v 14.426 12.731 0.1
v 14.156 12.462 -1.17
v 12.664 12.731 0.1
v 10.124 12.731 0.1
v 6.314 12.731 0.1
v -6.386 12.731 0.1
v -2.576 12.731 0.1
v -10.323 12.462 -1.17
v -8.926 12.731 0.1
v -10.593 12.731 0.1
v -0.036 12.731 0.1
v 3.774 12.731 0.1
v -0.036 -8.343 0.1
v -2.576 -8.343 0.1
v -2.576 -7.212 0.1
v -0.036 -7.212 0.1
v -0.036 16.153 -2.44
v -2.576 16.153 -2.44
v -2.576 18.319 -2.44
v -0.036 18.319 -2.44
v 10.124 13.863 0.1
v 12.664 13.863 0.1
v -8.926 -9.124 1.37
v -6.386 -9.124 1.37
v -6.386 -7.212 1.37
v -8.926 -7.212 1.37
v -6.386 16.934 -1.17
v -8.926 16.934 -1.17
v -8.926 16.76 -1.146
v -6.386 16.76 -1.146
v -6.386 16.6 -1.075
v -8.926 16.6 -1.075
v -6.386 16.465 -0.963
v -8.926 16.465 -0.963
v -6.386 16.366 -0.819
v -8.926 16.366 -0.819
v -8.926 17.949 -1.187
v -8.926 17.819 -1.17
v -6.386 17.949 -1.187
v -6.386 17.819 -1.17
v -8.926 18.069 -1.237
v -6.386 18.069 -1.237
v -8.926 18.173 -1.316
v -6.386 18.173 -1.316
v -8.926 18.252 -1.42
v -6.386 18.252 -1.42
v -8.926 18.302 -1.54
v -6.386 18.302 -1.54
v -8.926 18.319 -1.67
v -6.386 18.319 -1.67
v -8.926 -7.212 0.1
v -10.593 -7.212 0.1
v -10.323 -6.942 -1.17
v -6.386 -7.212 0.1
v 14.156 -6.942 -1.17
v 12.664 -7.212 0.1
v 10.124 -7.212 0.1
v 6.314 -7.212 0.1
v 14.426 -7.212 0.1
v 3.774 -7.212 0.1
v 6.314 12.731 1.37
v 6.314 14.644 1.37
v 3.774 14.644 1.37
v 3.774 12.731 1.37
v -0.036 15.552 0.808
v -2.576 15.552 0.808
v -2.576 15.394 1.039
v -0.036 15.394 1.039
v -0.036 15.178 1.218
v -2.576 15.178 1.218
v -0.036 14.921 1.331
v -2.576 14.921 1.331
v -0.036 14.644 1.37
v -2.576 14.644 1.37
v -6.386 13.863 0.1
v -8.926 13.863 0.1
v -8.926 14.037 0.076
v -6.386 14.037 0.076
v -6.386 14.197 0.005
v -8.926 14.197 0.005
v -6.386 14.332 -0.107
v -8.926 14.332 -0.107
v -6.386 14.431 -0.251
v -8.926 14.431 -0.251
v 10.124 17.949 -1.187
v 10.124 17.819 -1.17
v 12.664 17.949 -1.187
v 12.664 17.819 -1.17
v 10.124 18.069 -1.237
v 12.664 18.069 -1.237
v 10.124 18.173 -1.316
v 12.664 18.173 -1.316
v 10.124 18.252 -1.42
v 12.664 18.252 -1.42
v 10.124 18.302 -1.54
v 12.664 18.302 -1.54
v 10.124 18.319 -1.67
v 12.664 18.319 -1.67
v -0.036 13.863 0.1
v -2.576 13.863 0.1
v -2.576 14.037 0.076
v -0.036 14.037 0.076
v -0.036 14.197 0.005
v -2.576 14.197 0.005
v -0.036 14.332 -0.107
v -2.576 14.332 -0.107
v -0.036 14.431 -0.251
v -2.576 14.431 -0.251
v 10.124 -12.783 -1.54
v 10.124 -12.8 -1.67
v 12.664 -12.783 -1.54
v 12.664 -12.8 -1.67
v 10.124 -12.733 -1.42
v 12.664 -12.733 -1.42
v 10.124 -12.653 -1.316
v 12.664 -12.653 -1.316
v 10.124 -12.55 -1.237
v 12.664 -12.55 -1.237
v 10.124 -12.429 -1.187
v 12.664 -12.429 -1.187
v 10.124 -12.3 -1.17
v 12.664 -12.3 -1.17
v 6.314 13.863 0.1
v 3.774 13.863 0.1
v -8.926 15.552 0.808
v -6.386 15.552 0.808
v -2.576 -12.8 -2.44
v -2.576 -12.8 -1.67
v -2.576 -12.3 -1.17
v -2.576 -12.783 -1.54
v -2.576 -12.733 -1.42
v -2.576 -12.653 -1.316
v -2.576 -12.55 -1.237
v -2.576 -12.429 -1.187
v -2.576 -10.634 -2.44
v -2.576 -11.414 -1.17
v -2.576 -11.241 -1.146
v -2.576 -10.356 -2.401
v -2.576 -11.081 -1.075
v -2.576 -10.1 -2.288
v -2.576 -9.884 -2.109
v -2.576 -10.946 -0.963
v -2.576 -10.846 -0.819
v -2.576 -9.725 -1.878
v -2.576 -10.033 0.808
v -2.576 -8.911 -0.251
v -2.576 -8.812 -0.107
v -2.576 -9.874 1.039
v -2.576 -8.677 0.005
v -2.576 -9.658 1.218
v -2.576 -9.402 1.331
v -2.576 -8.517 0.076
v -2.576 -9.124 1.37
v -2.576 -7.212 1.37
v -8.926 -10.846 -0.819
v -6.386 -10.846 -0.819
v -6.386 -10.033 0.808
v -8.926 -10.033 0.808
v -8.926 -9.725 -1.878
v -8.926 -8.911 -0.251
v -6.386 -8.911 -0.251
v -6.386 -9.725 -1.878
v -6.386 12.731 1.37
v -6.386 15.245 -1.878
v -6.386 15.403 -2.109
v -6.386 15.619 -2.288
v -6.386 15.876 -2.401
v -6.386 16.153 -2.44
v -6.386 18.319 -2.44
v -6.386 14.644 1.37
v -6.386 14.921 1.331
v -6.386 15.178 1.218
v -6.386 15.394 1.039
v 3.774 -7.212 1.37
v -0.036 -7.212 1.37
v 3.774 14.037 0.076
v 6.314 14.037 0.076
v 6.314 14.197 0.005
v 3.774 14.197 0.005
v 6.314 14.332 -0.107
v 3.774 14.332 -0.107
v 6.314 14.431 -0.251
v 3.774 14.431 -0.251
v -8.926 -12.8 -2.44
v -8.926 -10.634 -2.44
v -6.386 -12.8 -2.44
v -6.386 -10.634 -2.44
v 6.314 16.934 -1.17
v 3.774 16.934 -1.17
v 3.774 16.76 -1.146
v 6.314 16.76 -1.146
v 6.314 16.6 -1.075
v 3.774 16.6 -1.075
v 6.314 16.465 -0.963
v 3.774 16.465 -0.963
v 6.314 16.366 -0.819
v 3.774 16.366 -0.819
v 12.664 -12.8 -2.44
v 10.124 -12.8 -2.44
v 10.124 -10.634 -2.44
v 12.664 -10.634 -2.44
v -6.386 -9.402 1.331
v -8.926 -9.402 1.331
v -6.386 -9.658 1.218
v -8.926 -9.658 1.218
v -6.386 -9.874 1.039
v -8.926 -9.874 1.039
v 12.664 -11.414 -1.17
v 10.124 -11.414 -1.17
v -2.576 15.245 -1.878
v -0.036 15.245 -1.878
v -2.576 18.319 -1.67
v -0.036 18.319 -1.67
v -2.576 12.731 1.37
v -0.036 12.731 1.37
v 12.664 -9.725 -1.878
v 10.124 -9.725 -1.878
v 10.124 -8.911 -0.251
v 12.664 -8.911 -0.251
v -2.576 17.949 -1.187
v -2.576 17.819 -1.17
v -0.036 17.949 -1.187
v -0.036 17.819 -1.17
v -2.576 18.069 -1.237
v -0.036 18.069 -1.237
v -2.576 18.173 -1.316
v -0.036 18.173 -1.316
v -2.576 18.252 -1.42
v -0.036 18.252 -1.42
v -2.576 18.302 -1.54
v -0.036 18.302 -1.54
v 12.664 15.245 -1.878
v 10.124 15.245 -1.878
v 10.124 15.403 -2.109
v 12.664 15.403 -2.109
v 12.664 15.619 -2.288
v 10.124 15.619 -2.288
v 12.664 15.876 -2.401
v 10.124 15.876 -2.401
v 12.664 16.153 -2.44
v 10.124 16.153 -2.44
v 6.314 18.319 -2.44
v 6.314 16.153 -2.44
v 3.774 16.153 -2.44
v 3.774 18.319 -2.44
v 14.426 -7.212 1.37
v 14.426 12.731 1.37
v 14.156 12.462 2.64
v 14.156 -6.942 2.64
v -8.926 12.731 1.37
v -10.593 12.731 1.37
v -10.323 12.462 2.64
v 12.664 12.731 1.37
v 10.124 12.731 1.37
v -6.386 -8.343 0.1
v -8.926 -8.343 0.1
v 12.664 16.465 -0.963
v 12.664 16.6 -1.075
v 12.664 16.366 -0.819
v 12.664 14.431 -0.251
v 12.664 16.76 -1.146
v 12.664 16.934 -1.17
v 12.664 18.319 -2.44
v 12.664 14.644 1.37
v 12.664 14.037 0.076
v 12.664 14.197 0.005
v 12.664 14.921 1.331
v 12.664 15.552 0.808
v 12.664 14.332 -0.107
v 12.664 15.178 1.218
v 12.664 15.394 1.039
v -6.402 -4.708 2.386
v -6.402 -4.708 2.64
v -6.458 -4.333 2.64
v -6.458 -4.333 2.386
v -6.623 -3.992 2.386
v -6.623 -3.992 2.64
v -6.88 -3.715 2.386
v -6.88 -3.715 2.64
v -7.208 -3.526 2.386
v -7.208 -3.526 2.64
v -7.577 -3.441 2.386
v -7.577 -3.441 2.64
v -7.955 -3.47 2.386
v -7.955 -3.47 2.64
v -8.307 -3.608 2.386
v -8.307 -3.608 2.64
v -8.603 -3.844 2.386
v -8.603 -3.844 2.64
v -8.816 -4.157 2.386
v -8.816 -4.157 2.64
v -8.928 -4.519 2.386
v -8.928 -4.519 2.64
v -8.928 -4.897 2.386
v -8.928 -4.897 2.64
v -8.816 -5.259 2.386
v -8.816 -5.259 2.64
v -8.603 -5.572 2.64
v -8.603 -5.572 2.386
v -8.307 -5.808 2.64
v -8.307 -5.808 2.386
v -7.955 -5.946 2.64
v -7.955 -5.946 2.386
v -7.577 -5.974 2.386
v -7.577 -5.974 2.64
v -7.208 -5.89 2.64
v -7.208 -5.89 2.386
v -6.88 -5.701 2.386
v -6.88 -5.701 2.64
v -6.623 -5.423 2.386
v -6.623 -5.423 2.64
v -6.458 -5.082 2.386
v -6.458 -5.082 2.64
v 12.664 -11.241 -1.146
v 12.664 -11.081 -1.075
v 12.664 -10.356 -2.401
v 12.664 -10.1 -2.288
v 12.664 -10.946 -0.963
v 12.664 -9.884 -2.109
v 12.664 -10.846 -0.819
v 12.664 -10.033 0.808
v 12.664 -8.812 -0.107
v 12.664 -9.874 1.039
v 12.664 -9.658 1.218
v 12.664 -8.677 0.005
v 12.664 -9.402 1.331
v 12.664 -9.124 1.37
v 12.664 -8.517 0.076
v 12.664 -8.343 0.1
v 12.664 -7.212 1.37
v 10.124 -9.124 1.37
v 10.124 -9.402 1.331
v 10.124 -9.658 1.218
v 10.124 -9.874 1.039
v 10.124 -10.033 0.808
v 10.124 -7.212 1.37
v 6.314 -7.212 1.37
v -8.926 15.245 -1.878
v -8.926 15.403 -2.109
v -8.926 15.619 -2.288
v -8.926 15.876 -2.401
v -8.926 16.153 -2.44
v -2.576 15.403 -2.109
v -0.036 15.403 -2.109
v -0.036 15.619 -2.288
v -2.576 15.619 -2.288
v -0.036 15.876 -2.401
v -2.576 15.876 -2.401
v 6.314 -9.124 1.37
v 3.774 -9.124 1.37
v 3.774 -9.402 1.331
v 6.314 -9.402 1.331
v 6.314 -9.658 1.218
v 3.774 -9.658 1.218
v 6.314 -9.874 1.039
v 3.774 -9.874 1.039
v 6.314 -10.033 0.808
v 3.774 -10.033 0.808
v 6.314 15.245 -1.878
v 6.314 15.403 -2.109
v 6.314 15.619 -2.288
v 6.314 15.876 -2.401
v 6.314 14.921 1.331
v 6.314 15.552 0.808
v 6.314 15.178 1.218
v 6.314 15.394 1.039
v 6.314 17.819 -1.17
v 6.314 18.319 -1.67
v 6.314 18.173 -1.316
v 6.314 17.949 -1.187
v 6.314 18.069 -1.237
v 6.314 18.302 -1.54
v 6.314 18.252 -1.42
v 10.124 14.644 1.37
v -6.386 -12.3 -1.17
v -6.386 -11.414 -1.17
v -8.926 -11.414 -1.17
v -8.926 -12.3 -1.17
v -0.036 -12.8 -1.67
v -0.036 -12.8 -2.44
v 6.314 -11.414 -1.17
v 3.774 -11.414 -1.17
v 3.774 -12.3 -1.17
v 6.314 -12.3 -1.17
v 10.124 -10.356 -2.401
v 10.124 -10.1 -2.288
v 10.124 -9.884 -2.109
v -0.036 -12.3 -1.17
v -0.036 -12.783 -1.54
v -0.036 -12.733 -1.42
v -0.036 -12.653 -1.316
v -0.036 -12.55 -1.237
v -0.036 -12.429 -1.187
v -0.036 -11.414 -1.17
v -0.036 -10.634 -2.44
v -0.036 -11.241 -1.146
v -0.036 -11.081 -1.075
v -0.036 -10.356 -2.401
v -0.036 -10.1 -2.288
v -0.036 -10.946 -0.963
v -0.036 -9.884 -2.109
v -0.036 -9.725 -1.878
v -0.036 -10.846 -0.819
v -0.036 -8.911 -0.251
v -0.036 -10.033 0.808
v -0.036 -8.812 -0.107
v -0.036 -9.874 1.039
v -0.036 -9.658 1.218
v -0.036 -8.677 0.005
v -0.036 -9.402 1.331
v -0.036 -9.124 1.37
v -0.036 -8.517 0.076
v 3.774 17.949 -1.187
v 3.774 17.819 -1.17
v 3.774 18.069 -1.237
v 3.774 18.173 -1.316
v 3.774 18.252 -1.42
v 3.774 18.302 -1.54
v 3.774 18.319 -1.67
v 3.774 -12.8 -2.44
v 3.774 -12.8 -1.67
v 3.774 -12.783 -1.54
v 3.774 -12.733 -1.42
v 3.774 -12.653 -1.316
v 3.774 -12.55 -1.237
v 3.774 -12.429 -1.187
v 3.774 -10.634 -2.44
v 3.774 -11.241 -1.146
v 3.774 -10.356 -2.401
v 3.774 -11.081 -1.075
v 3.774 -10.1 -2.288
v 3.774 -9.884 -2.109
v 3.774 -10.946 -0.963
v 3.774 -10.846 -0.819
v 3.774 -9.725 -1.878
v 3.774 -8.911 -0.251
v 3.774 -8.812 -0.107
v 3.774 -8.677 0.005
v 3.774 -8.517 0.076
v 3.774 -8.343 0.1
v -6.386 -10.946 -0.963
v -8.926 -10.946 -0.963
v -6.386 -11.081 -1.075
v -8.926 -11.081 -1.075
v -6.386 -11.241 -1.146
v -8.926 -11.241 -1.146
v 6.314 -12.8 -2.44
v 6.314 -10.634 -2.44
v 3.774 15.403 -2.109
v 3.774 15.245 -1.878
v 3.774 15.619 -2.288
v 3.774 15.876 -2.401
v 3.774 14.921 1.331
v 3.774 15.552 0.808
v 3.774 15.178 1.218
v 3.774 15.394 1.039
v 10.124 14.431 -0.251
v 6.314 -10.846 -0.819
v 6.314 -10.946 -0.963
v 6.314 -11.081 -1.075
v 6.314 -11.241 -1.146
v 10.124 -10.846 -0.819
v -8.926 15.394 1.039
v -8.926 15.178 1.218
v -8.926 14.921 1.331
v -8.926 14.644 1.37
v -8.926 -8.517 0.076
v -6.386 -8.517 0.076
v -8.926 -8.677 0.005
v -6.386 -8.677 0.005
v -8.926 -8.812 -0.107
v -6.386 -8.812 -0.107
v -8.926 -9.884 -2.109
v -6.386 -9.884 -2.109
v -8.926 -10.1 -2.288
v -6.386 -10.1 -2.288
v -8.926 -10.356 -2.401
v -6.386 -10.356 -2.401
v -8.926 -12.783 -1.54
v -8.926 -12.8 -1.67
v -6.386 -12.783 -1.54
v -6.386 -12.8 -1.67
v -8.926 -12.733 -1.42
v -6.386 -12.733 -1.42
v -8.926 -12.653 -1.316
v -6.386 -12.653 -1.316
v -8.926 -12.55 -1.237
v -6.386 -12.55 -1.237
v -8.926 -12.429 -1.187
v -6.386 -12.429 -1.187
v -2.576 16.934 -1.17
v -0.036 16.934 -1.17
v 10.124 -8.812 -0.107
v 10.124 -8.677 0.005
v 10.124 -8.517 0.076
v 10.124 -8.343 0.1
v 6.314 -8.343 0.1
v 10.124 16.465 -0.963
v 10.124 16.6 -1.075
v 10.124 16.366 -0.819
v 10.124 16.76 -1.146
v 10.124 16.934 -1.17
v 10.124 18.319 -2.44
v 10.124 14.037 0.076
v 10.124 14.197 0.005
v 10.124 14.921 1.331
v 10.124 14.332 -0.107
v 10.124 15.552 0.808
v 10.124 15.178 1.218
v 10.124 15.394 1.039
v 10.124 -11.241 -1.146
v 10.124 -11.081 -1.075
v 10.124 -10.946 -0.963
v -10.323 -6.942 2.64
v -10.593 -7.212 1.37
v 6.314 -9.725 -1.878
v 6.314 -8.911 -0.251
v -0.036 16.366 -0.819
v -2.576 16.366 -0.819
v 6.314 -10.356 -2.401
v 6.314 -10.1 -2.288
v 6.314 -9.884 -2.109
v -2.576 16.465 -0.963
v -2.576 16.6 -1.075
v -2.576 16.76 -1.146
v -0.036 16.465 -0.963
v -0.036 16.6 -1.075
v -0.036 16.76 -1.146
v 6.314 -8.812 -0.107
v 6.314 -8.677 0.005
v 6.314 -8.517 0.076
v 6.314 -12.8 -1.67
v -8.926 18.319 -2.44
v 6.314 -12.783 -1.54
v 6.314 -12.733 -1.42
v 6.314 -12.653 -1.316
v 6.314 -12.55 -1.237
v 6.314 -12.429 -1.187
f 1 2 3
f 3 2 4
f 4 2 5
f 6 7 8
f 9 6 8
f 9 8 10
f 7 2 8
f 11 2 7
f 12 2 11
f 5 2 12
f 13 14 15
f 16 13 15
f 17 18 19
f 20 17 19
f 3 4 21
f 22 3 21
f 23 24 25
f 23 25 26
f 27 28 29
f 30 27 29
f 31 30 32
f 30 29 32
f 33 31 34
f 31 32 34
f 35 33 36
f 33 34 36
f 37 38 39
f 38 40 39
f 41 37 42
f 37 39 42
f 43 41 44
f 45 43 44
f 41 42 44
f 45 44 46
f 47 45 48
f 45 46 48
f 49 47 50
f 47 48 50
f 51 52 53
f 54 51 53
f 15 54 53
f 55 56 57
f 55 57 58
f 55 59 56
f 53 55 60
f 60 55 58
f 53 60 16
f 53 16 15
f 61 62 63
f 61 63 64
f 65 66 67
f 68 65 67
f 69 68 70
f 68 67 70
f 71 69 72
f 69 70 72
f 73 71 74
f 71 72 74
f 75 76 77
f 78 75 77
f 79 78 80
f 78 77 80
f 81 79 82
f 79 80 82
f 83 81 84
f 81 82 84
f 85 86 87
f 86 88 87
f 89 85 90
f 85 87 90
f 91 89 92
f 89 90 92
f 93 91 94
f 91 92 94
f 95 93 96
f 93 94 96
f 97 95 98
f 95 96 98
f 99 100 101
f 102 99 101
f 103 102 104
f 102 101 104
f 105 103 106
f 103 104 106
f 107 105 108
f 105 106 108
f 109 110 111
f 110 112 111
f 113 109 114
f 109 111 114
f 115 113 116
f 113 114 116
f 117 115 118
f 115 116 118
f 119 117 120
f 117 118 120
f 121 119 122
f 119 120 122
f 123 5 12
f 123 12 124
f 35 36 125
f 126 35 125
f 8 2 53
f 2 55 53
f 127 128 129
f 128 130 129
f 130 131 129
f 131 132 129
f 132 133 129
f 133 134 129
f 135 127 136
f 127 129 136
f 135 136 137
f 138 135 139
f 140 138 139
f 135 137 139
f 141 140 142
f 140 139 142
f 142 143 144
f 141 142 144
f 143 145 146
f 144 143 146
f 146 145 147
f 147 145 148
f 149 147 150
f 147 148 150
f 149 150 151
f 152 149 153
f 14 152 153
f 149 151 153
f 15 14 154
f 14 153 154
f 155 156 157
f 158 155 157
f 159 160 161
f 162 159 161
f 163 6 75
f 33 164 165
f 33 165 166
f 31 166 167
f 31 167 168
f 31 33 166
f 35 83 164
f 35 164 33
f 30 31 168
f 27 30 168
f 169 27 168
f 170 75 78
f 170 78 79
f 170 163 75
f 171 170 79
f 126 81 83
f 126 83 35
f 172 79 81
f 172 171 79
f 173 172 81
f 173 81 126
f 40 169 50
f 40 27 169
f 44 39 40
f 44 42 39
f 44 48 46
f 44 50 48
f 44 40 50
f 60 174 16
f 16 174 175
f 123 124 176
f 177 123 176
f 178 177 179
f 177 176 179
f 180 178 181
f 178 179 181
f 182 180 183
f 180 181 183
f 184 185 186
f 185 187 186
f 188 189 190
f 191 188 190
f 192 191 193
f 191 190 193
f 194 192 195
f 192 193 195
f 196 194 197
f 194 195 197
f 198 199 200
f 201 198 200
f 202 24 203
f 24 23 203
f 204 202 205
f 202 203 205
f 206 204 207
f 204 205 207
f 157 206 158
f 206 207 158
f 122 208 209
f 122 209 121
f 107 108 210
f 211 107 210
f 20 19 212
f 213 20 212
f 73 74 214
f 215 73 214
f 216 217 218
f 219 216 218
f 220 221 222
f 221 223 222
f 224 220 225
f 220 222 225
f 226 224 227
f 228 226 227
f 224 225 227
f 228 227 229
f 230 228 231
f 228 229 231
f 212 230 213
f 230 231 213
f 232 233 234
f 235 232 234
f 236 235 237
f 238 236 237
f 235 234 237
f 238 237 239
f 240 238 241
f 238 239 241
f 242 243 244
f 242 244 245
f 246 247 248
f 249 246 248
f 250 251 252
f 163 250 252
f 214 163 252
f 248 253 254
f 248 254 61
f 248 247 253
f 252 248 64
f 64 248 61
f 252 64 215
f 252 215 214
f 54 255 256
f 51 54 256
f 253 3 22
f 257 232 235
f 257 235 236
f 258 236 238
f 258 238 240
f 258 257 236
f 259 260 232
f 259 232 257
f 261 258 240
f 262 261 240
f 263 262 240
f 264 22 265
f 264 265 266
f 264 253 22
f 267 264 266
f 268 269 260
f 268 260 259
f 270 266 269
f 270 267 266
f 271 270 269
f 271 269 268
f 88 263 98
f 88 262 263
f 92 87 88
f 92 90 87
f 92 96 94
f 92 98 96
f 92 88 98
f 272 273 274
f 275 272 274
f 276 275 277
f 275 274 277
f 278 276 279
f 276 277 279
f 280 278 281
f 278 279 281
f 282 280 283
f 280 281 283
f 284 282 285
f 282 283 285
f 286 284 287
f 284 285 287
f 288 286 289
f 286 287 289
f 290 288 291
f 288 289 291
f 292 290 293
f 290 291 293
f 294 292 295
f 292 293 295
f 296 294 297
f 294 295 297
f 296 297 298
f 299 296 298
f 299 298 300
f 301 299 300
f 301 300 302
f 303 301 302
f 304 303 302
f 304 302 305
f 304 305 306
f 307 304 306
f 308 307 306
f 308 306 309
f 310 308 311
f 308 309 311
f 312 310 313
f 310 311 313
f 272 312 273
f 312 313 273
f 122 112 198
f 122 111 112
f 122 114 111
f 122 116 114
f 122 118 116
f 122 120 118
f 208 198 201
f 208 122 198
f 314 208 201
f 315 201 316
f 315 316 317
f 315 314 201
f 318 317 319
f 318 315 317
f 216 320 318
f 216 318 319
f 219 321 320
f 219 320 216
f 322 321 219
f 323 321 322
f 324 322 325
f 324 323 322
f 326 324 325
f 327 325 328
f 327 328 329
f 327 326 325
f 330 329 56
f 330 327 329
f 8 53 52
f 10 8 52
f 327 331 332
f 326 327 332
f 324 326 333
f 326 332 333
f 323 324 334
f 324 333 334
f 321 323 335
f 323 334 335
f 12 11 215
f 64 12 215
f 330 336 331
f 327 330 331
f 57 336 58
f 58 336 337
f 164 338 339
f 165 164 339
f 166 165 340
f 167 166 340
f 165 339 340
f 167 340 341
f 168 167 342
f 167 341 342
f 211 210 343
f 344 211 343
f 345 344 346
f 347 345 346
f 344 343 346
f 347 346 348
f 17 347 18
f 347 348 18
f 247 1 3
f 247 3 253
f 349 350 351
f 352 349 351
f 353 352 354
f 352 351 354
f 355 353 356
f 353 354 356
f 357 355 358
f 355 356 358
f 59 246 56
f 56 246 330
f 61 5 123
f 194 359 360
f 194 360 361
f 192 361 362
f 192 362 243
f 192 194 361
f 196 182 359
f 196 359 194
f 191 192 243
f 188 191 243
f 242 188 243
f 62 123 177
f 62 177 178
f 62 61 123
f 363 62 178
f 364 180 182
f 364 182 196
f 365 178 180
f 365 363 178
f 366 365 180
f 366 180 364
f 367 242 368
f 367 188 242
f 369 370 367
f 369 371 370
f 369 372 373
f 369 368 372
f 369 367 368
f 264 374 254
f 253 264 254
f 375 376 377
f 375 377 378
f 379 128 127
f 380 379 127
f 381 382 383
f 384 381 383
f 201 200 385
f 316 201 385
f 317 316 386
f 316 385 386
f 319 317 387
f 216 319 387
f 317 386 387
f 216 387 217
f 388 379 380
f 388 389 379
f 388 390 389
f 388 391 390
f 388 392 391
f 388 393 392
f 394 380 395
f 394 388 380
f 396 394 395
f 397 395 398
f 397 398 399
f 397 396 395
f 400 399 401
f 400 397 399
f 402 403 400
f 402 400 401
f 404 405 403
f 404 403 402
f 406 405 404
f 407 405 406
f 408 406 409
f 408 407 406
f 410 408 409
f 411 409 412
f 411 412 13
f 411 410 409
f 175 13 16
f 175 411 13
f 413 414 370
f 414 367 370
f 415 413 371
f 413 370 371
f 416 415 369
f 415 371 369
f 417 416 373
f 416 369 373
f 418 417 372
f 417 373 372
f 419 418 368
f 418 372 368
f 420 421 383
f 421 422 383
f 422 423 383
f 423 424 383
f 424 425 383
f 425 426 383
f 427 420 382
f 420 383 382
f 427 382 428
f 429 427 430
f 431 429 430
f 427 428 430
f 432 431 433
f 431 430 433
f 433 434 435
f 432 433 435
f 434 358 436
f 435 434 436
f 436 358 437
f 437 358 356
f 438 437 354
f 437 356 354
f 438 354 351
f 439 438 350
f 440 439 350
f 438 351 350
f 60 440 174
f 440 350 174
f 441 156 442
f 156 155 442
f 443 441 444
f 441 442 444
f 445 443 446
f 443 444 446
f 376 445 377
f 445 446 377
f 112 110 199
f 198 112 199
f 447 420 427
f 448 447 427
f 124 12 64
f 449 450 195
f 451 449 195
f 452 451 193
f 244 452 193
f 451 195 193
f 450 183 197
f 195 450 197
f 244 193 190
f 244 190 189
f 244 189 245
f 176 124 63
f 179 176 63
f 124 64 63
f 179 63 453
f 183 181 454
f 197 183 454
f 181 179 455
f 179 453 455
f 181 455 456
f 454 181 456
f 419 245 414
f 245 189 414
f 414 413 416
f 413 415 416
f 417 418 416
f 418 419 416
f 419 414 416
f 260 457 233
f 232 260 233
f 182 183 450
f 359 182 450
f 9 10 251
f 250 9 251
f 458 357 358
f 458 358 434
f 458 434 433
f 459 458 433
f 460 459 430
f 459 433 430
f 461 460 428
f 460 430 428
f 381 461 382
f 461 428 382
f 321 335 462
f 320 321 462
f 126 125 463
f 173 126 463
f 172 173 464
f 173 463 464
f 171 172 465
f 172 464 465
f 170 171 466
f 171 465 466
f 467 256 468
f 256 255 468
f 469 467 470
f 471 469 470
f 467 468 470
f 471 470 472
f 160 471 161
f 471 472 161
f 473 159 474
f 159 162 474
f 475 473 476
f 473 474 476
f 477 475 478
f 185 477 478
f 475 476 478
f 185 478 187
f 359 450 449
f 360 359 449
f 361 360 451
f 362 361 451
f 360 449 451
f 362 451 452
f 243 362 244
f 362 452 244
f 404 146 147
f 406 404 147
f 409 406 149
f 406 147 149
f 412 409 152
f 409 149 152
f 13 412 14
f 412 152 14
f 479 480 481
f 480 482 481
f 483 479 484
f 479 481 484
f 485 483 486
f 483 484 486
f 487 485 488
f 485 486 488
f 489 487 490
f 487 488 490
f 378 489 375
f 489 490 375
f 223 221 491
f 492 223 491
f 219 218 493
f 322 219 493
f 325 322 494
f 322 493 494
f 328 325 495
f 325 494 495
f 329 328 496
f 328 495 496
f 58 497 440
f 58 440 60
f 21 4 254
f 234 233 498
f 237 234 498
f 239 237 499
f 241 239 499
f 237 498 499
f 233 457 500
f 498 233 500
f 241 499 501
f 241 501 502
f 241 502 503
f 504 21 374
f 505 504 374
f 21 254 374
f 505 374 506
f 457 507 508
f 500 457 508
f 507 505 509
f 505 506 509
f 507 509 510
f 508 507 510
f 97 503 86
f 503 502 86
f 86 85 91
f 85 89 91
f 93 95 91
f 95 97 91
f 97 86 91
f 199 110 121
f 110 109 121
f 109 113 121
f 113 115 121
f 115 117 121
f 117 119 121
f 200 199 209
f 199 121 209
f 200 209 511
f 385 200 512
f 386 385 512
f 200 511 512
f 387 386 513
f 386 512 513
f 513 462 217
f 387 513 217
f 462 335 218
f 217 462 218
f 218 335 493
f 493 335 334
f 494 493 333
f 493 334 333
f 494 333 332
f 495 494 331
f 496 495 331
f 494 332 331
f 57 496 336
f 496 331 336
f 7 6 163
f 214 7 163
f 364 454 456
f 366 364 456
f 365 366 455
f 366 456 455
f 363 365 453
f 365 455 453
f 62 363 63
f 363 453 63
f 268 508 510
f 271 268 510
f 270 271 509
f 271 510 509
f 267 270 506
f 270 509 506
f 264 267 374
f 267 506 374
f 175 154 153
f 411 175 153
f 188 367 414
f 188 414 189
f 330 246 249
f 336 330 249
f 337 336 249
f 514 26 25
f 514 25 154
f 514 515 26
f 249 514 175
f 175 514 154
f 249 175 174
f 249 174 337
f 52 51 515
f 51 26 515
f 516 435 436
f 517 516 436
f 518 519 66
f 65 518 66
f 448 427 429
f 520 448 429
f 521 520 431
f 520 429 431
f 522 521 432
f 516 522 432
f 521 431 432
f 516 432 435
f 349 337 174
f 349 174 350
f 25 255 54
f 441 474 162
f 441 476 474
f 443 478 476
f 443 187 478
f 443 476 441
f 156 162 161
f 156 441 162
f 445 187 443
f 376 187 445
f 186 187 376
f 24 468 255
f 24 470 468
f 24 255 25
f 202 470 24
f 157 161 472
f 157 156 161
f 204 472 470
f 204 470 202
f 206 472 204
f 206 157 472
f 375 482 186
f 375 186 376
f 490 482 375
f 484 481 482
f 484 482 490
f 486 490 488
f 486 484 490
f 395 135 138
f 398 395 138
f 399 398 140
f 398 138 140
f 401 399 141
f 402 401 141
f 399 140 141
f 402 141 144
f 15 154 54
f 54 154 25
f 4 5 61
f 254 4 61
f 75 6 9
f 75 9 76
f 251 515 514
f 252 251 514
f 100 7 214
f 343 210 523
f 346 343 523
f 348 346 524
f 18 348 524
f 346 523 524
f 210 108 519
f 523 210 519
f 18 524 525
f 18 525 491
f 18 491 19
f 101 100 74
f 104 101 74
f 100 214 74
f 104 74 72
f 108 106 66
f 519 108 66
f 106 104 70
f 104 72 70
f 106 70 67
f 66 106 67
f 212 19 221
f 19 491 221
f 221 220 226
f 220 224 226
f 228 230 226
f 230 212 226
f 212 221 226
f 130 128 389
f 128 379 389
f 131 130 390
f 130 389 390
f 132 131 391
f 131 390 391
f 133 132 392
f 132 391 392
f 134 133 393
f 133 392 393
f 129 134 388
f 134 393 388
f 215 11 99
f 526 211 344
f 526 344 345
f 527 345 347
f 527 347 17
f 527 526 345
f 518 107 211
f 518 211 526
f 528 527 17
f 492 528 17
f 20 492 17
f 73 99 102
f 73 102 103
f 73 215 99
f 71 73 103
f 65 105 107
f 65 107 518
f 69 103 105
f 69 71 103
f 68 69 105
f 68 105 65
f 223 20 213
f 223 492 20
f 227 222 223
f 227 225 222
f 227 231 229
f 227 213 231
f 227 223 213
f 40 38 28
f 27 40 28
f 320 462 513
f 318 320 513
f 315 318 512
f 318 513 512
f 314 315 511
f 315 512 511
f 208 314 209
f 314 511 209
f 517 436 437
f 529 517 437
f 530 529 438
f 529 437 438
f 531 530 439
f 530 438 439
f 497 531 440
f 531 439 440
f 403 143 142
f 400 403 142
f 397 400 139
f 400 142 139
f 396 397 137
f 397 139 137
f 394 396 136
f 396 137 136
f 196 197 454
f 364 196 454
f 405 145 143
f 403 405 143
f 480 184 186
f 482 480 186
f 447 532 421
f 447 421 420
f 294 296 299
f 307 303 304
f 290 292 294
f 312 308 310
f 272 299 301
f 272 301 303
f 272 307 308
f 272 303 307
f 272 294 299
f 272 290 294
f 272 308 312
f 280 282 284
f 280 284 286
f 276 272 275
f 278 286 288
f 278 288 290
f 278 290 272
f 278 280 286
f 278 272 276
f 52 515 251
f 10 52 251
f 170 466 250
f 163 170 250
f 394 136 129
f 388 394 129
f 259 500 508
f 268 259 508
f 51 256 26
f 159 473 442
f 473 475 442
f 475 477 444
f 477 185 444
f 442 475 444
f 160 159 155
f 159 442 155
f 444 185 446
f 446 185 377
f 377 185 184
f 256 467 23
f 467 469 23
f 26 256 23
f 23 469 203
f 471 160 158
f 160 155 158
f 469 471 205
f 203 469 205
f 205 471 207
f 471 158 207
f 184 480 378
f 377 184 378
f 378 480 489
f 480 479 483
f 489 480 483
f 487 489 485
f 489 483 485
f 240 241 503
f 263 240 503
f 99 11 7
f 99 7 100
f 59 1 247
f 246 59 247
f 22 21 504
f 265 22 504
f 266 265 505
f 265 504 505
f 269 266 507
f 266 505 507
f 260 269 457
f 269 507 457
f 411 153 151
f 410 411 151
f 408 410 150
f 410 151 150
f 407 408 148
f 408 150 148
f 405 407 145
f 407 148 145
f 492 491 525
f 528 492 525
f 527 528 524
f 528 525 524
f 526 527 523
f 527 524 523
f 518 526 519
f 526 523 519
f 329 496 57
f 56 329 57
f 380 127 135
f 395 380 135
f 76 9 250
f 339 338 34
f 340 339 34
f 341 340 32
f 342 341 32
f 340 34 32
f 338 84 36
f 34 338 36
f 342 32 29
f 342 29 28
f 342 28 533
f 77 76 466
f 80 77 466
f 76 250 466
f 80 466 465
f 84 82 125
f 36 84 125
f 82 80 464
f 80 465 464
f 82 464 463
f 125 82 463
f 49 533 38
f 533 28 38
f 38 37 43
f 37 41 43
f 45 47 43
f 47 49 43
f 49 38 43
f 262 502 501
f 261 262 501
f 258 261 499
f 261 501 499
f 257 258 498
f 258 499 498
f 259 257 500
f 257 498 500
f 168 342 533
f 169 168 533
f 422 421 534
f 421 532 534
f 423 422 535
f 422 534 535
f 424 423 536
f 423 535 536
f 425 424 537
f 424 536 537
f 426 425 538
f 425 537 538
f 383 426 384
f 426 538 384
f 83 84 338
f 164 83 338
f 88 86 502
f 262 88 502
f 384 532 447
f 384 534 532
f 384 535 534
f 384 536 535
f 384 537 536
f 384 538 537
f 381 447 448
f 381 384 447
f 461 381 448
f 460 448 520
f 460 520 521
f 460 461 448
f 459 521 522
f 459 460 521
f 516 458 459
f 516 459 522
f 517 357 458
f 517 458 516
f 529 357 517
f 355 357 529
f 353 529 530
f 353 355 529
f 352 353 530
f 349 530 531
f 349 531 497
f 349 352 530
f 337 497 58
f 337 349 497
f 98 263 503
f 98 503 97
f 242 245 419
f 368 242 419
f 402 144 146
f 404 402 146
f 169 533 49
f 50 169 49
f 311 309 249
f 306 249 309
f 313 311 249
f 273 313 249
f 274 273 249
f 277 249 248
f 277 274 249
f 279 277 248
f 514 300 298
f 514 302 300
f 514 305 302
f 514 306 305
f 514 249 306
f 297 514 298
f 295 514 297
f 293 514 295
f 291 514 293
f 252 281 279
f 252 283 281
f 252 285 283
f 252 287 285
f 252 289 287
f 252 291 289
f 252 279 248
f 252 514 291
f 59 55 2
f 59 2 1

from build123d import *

# Parameters (mm, degrees)
SKETCH1_W            = 0.8128
SKETCH1_H            = 0.508
BASE_EXTRUDE_DEPTH   = 0.254
SKETCH6_W            = 0.4572
SKETCH6_H            = 0.508
BOSS_EXTRUDE1_DEPTH  = 0.508
CHAMFER1_SIZE        = 0.508
CHAMFER1_SIZE_2      = 0.254
CHAMFER2_SIZE        = 0.254
CHAMFER2_SIZE2       = 0.508
SKETCH12_W           = 0.508
SKETCH12_H           = 0.254
BOSS_EXTRUDE6_DEPTH  = 0.3048
SKETCH13_W           = 5.0038
SKETCH13_H           = 0.762
BOSS_EXTRUDE7_DEPTH  = 3.9878
FILLET3_R            = 0.127
FILLET4_R            = 0.2032
LPATTERN5_START      = 1.019206572
LPATTERN5_DEPTH      = 0.508
LPATTERN5_START_2    = 2.289206572
LPATTERN5_2_DEPTH    = 0.508
LPATTERN5_START_3    = 3.559206572
LPATTERN5_3_DEPTH    = 0.508
MIRROR22_START       = -0.250793428
MIRROR22_DEPTH       = 0.508
MIRROR22_START_2     = 1.019206572
MIRROR22_2_DEPTH     = 0.508
MIRROR22_START_3     = 2.289206572
MIRROR22_3_DEPTH     = 0.508
MIRROR22_START_4     = 3.559206572
MIRROR22_4_DEPTH     = 0.508
MIRROR22_START_5     = -0.5842
MIRROR22_5_OUTLINE_W = 0.000876316
MIRROR22_5_OUTLINE_H = 0.762
MIRROR22_5_DEPTH     = 5.0038
CHAMFER3_SIZE        = 0.254
CHAMFER3_SIZE_2      = 0.053989367
SKETCH14_R           = 0.254
CUT_EXTRUDE1_DEPTH   = 0.0508
SCALE1_SCALE         = 5
FILLET5_R            = 0.500000016


# Read off the part's stored shape, not the designer's step: LPattern5, Mirror22
with BuildPart() as part:
    # Sketch1 → Base-Extrude (new body)
    with BuildSketch(Plane(origin=(0.003206572, 0.159581842, 0), x_dir=(0, -1, 0), z_dir=(0, 0, 1))):
        with Locations((0.1016, 0)):
            Rectangle(SKETCH1_W, SKETCH1_H)
    extrude(amount=BASE_EXTRUDE_DEPTH)

    # Sketch6 → Boss-Extrude1 (add)
    with BuildSketch(Plane(origin=(0.003206572, -0.043618158, 0.254), x_dir=(0, 1, 0), z_dir=(0, 0, 1))):
        with Locations((0.2794, 0)):
            Rectangle(SKETCH6_W, SKETCH6_H)
    extrude(amount=BOSS_EXTRUDE1_DEPTH)

    # Chamfer1
    # the kernel refuses this chamfer: 0.508, 0.254 mm, written as the material it takes off along each edge
    with BuildSketch(Plane(origin=(1.572839639, 0.007181842, 0.762), x_dir=(0, -0.017268075123668125, -0.9998508956747116), z_dir=(-1, 0, 0))) as chamfer1_piece_1_section:
        Polygon((CHAMFER1_SIZE * 0.999850895675, -CHAMFER1_SIZE * 0.0172680751237), (-CHAMFER1_SIZE_2 * 0.0172680751237, -CHAMFER1_SIZE_2 * 0.999850895675), (0, 0), align=None)
    chamfer1_piece_1 = extrude(amount=3.139266136, mode=Mode.PRIVATE)
    chamfer1_piece_1 = split(chamfer1_piece_1, bisect_by=Plane(origin=(0.003206572, 0.088077409, 0.254), z_dir=(0, 0, 1)), keep=Keep.TOP, mode=Mode.PRIVATE)
    add(chamfer1_piece_1, mode=Mode.SUBTRACT)

    # Chamfer2
    chamfer2_edges = [part.edges().sort_by_distance(p)[0] for p in [
        (0.003206572, 0.464381842, 0),
    ]]
    chamfer2_side = [part.faces().sort_by_distance(p)[0] for p in [
        (0.003206572, 0.057981842, 0),
    ]]
    chamfer(chamfer2_edges, length=CHAMFER2_SIZE, length2=CHAMFER2_SIZE2, reference=chamfer2_side[0])

    # Sketch12 → Boss-Extrude6 (add)
    with BuildSketch(Plane(origin=(0, 0.464381842, 0), x_dir=(-1, 0, 0), z_dir=(0, 1, 0))):
        with Locations((-0.003206572, 0.635)):
            Rectangle(SKETCH12_W, SKETCH12_H)
    extrude(amount=BOSS_EXTRUDE6_DEPTH)

    # Sketch13 → Boss-Extrude7 (add)
    with BuildSketch(Plane(origin=(0, 0.769181842, 0), x_dir=(-1, 0, 0), z_dir=(0, 1, 0))):
        with Locations((-1.9177, 0.635)):
            Rectangle(SKETCH13_W, SKETCH13_H)
    extrude(amount=BOSS_EXTRUDE7_DEPTH)

    # Fillet3
    fillet3_edges = [part.edges().sort_by_distance(p)[0] for p in [
        (0.003206572, 0.007181842, 0.254),
        (0.003206572, 0.464381842, 0.508),
    ]]
    fillet(fillet3_edges, radius=FILLET3_R)

    # Fillet4
    fillet4_edges = [part.edges().sort_by_distance(p)[0] for p in [
        (0.003206572, 0.261181842, 0.762),
        (0.003206572, 0.210381842, 0),
    ]]
    fillet(fillet4_edges, radius=FILLET4_R)

    # LPattern5 outline → LPattern5 (add)
    with BuildSketch(Plane.YZ.offset(LPATTERN5_START)):
        with BuildLine():
            Line((-0.348418158, 0.254), (-0.348418158, 0))
            Line((-0.348418158, 0), (0.084797335, 0))
            ThreePointArc((0.084797335, 0), (0.191625897, 0.030347756), (0.26654494, 0.112326197))
            Line((0.26654494, 0.112326197), (0.429279905, 0.437796127))
            ThreePointArc((0.429279905, 0.437796127), (0.476104307, 0.489032653), (0.542872158, 0.508))
            Line((0.542872158, 0.508), (0.769181842, 0.508))
            Line((0.769181842, 0.508), (0.769181842, 0.762))
            Line((0.769181842, 0.762), (0.386766348, 0.762))
            ThreePointArc((0.386766348, 0.762), (0.279937786, 0.731652244), (0.205018743, 0.649673803))
            Line((0.205018743, 0.649673803), (0.042283778, 0.324203873))
            ThreePointArc((0.042283778, 0.324203873), (-0.004540624, 0.272967347), (-0.071308475, 0.254))
            Line((-0.071308475, 0.254), (-0.348418158, 0.254))
        make_face()
    extrude(amount=LPATTERN5_DEPTH)

    # LPattern5 2 outline → LPattern5 2 (add)
    with BuildSketch(Plane.YZ.offset(LPATTERN5_START_2)):
        with BuildLine():
            Line((-0.348418158, 0.254), (-0.348418158, 0))
            Line((-0.348418158, 0), (0.084797335, 0))
            ThreePointArc((0.084797335, 0), (0.191625897, 0.030347756), (0.26654494, 0.112326197))
            Line((0.26654494, 0.112326197), (0.429279905, 0.437796127))
            ThreePointArc((0.429279905, 0.437796127), (0.476104307, 0.489032653), (0.542872158, 0.508))
            Line((0.542872158, 0.508), (0.769181842, 0.508))
            Line((0.769181842, 0.508), (0.769181842, 0.762))
            Line((0.769181842, 0.762), (0.386766348, 0.762))
            ThreePointArc((0.386766348, 0.762), (0.279937786, 0.731652244), (0.205018743, 0.649673803))
            Line((0.205018743, 0.649673803), (0.042283778, 0.324203873))
            ThreePointArc((0.042283778, 0.324203873), (-0.004540624, 0.272967347), (-0.071308475, 0.254))
            Line((-0.071308475, 0.254), (-0.348418158, 0.254))
        make_face()
    extrude(amount=LPATTERN5_2_DEPTH)

    # LPattern5 3 outline → LPattern5 3 (add)
    with BuildSketch(Plane.YZ.offset(LPATTERN5_START_3)):
        with BuildLine():
            Line((-0.348418158, 0.254), (-0.348418158, 0))
            Line((-0.348418158, 0), (0.084797335, 0))
            ThreePointArc((0.084797335, 0), (0.191625897, 0.030347756), (0.26654494, 0.112326197))
            Line((0.26654494, 0.112326197), (0.429279905, 0.437796127))
            ThreePointArc((0.429279905, 0.437796127), (0.476104307, 0.489032653), (0.542872158, 0.508))
            Line((0.542872158, 0.508), (0.769181842, 0.508))
            Line((0.769181842, 0.508), (0.769181842, 0.762))
            Line((0.769181842, 0.762), (0.386766348, 0.762))
            ThreePointArc((0.386766348, 0.762), (0.279937786, 0.731652244), (0.205018743, 0.649673803))
            Line((0.205018743, 0.649673803), (0.042283778, 0.324203873))
            ThreePointArc((0.042283778, 0.324203873), (-0.004540624, 0.272967347), (-0.071308475, 0.254))
            Line((-0.071308475, 0.254), (-0.348418158, 0.254))
        make_face()
    extrude(amount=LPATTERN5_3_DEPTH)

    # Mirror22 outline → Mirror22 (add)
    with BuildSketch(Plane.YZ.offset(MIRROR22_START)):
        with BuildLine():
            Line((4.756981842, 0.254), (4.757858158, 0.254))
            Line((4.757858158, 0.254), (4.757858158, 0.508))
            Line((4.757858158, 0.508), (4.984167842, 0.508))
            ThreePointArc((4.984167842, 0.508), (5.050935693, 0.489032653), (5.097760095, 0.437796127))
            Line((5.097760095, 0.437796127), (5.26049506, 0.112326197))
            ThreePointArc((5.26049506, 0.112326197), (5.335414103, 0.030347756), (5.442242665, 0))
            Line((5.442242665, 0), (5.875458158, 0))
            Line((5.875458158, 0), (5.875458158, 0.254))
            Line((5.875458158, 0.254), (5.598348475, 0.254))
            ThreePointArc((5.598348475, 0.254), (5.531580624, 0.272967347), (5.484756222, 0.324203873))
            Line((5.484756222, 0.324203873), (5.322021257, 0.649673803))
            ThreePointArc((5.322021257, 0.649673803), (5.247102214, 0.731652244), (5.140273652, 0.762))
            Line((5.140273652, 0.762), (4.757858158, 0.762))
            Line((4.757858158, 0.762), (4.757858158, 1.016))
            Line((4.757858158, 1.016), (4.756981842, 1.016))
            Line((4.756981842, 1.016), (4.756981842, 0.254))
        make_face()
    extrude(amount=MIRROR22_DEPTH)

    # Mirror22 2 outline → Mirror22 2 (add)
    with BuildSketch(Plane.YZ.offset(MIRROR22_START_2)):
        with BuildLine():
            Line((4.756981842, 0.254), (4.757858158, 0.254))
            Line((4.757858158, 0.254), (4.757858158, 0.508))
            Line((4.757858158, 0.508), (4.984167842, 0.508))
            ThreePointArc((4.984167842, 0.508), (5.050935693, 0.489032653), (5.097760095, 0.437796127))
            Line((5.097760095, 0.437796127), (5.26049506, 0.112326197))
            ThreePointArc((5.26049506, 0.112326197), (5.335414103, 0.030347756), (5.442242665, 0))
            Line((5.442242665, 0), (5.875458158, 0))
            Line((5.875458158, 0), (5.875458158, 0.254))
            Line((5.875458158, 0.254), (5.598348475, 0.254))
            ThreePointArc((5.598348475, 0.254), (5.531580624, 0.272967347), (5.484756222, 0.324203873))
            Line((5.484756222, 0.324203873), (5.322021257, 0.649673803))
            ThreePointArc((5.322021257, 0.649673803), (5.247102214, 0.731652244), (5.140273652, 0.762))
            Line((5.140273652, 0.762), (4.757858158, 0.762))
            Line((4.757858158, 0.762), (4.757858158, 1.016))
            Line((4.757858158, 1.016), (4.756981842, 1.016))
            Line((4.756981842, 1.016), (4.756981842, 0.254))
        make_face()
    extrude(amount=MIRROR22_2_DEPTH)

    # Mirror22 3 outline → Mirror22 3 (add)
    with BuildSketch(Plane.YZ.offset(MIRROR22_START_3)):
        with BuildLine():
            Line((4.756981842, 0.254), (4.757858158, 0.254))
            Line((4.757858158, 0.254), (4.757858158, 0.508))
            Line((4.757858158, 0.508), (4.984167842, 0.508))
            ThreePointArc((4.984167842, 0.508), (5.050935693, 0.489032653), (5.097760095, 0.437796127))
            Line((5.097760095, 0.437796127), (5.26049506, 0.112326197))
            ThreePointArc((5.26049506, 0.112326197), (5.335414103, 0.030347756), (5.442242665, 0))
            Line((5.442242665, 0), (5.875458158, 0))
            Line((5.875458158, 0), (5.875458158, 0.254))
            Line((5.875458158, 0.254), (5.598348475, 0.254))
            ThreePointArc((5.598348475, 0.254), (5.531580624, 0.272967347), (5.484756222, 0.324203873))
            Line((5.484756222, 0.324203873), (5.322021257, 0.649673803))
            ThreePointArc((5.322021257, 0.649673803), (5.247102214, 0.731652244), (5.140273652, 0.762))
            Line((5.140273652, 0.762), (4.757858158, 0.762))
            Line((4.757858158, 0.762), (4.757858158, 1.016))
            Line((4.757858158, 1.016), (4.756981842, 1.016))
            Line((4.756981842, 1.016), (4.756981842, 0.254))
        make_face()
    extrude(amount=MIRROR22_3_DEPTH)

    # Mirror22 4 outline → Mirror22 4 (add)
    with BuildSketch(Plane.YZ.offset(MIRROR22_START_4)):
        with BuildLine():
            Line((4.756981842, 0.254), (4.757858158, 0.254))
            Line((4.757858158, 0.254), (4.757858158, 0.508))
            Line((4.757858158, 0.508), (4.984167842, 0.508))
            ThreePointArc((4.984167842, 0.508), (5.050935693, 0.489032653), (5.097760095, 0.437796127))
            Line((5.097760095, 0.437796127), (5.26049506, 0.112326197))
            ThreePointArc((5.26049506, 0.112326197), (5.335414103, 0.030347756), (5.442242665, 0))
            Line((5.442242665, 0), (5.875458158, 0))
            Line((5.875458158, 0), (5.875458158, 0.254))
            Line((5.875458158, 0.254), (5.598348475, 0.254))
            ThreePointArc((5.598348475, 0.254), (5.531580624, 0.272967347), (5.484756222, 0.324203873))
            Line((5.484756222, 0.324203873), (5.322021257, 0.649673803))
            ThreePointArc((5.322021257, 0.649673803), (5.247102214, 0.731652244), (5.140273652, 0.762))
            Line((5.140273652, 0.762), (4.757858158, 0.762))
            Line((4.757858158, 0.762), (4.757858158, 1.016))
            Line((4.757858158, 1.016), (4.756981842, 1.016))
            Line((4.756981842, 1.016), (4.756981842, 0.254))
        make_face()
    extrude(amount=MIRROR22_4_DEPTH)

    # Mirror22 5 outline → Mirror22 5 (add)
    with BuildSketch(Plane.YZ.offset(MIRROR22_START_5)):
        with Locations((4.75742, 0.635)):
            Rectangle(MIRROR22_5_OUTLINE_W, MIRROR22_5_OUTLINE_H)
    extrude(amount=MIRROR22_5_DEPTH)

    # Chamfer3
    # the kernel refuses this chamfer: 0.254, 0.053989367 mm, written as the material it takes off along each edge
    with BuildSketch(Plane(origin=(5.079466081, 4.757858158, 1.016), x_dir=(0, 0.008003073799517865, -0.9999679748920758), z_dir=(-1, 0, 0)), Plane(origin=(-1.244066081, 0.769181842, 1.016), x_dir=(0, -0.008003073799517023, -0.9999679748920758), z_dir=(1, 0, 0)), Plane(origin=(5.079466081, 0.769181842, 0.254), x_dir=(0, -0.008003073799517023, 0.9999679748920758), z_dir=(-1, 0, 0))) as chamfer3_piece_1:
        Polygon((CHAMFER3_SIZE * 0.999967974892, CHAMFER3_SIZE * 0.00800307379952), (-CHAMFER3_SIZE_2 * 0.00800307374974, CHAMFER3_SIZE_2 * 0.999967968672), (0, 0), align=None)
    extrude(amount=6.323532163, mode=Mode.SUBTRACT)
    with BuildSketch(Plane(origin=(-1.244066081, 4.757858158, 0.254), x_dir=(0, -0.9846701949274145, -0.17442650951506075), z_dir=(1, 0, 0))) as chamfer3_piece_2:
        Polygon((CHAMFER3_SIZE_2 * 0.984670188803, -CHAMFER3_SIZE_2 * 0.17442650843), (-CHAMFER3_SIZE * 0.174426509515, -CHAMFER3_SIZE * 0.984670194927), (0, 0), align=None)
    extrude(amount=6.323532163, mode=Mode.SUBTRACT)
    with BuildSketch(Plane(origin=(-0.5842, 5.417724239, 0.254), x_dir=(0.9846701949274143, 0, -0.17442650951506142), z_dir=(0, -1, 0)), Plane(origin=(4.4196, 0.10931576, 0.254), x_dir=(-0.9846701949274145, 0, -0.17442650951506075), z_dir=(0, 1, 0))) as chamfer3_piece_3:
        Polygon((CHAMFER3_SIZE_2 * 0.984670188803, CHAMFER3_SIZE_2 * 0.17442650843), (-CHAMFER3_SIZE * 0.174426509515, CHAMFER3_SIZE * 0.984670194927), (0, 0), align=None)
    extrude(amount=5.308408479, mode=Mode.SUBTRACT)
    with BuildSketch(Plane(origin=(-0.5842, 5.417724239, 1.016), x_dir=(-0.008003073799517023, 0, -0.9999679748920758), z_dir=(0, -1, 0)), Plane(origin=(4.4196, 0.10931576, 1.016), x_dir=(0.008003073799517865, 0, -0.9999679748920758), z_dir=(0, 1, 0))) as chamfer3_piece_4:
        Polygon((CHAMFER3_SIZE * 0.999967974892, CHAMFER3_SIZE * 0.00800307379952), (-CHAMFER3_SIZE_2 * 0.00800307374974, CHAMFER3_SIZE_2 * 0.999967968672), (0, 0), align=None)
    extrude(amount=5.308408479, mode=Mode.SUBTRACT)

    # Sketch14 → Cut-Extrude1 (cut)
    with BuildSketch(Plane.XY.offset(1.016)):
        with Locations((0, 1.27)):
            Circle(SKETCH14_R)
    extrude(amount=-CUT_EXTRUDE1_DEPTH, mode=Mode.SUBTRACT)


with BuildPart() as part_1:
    # Scale1: scaled about (1.91799889, 2.764451225, 0.609977057)
    add(part.part.scale(SCALE1_SCALE).moved(Location((-7.67199556, -11.0578049, -2.439908228))))

    # Fillet5
    fillet5_edges = [part_1.edges().sort_by_distance(p)[0] for p in [
        (-7.655962702, -12.799895691, -1.169908228),
        (-1.3059627, -12.79989569, -1.169908228),
        (5.0440373, -12.79989569, -1.169908228),
        (11.3940373, -12.79989569, -1.169908228),
        (-7.6559627, 18.31948589, -1.169908228),
        (-1.3059627, 18.31948589, -1.169908228),
        (5.0440373, 18.31948589, -1.169908228),
        (11.3940373, 18.31948589, -1.169908228),
    ]]
    fillet(fillet5_edges, radius=FILLET5_R)


solid = part_1.part
